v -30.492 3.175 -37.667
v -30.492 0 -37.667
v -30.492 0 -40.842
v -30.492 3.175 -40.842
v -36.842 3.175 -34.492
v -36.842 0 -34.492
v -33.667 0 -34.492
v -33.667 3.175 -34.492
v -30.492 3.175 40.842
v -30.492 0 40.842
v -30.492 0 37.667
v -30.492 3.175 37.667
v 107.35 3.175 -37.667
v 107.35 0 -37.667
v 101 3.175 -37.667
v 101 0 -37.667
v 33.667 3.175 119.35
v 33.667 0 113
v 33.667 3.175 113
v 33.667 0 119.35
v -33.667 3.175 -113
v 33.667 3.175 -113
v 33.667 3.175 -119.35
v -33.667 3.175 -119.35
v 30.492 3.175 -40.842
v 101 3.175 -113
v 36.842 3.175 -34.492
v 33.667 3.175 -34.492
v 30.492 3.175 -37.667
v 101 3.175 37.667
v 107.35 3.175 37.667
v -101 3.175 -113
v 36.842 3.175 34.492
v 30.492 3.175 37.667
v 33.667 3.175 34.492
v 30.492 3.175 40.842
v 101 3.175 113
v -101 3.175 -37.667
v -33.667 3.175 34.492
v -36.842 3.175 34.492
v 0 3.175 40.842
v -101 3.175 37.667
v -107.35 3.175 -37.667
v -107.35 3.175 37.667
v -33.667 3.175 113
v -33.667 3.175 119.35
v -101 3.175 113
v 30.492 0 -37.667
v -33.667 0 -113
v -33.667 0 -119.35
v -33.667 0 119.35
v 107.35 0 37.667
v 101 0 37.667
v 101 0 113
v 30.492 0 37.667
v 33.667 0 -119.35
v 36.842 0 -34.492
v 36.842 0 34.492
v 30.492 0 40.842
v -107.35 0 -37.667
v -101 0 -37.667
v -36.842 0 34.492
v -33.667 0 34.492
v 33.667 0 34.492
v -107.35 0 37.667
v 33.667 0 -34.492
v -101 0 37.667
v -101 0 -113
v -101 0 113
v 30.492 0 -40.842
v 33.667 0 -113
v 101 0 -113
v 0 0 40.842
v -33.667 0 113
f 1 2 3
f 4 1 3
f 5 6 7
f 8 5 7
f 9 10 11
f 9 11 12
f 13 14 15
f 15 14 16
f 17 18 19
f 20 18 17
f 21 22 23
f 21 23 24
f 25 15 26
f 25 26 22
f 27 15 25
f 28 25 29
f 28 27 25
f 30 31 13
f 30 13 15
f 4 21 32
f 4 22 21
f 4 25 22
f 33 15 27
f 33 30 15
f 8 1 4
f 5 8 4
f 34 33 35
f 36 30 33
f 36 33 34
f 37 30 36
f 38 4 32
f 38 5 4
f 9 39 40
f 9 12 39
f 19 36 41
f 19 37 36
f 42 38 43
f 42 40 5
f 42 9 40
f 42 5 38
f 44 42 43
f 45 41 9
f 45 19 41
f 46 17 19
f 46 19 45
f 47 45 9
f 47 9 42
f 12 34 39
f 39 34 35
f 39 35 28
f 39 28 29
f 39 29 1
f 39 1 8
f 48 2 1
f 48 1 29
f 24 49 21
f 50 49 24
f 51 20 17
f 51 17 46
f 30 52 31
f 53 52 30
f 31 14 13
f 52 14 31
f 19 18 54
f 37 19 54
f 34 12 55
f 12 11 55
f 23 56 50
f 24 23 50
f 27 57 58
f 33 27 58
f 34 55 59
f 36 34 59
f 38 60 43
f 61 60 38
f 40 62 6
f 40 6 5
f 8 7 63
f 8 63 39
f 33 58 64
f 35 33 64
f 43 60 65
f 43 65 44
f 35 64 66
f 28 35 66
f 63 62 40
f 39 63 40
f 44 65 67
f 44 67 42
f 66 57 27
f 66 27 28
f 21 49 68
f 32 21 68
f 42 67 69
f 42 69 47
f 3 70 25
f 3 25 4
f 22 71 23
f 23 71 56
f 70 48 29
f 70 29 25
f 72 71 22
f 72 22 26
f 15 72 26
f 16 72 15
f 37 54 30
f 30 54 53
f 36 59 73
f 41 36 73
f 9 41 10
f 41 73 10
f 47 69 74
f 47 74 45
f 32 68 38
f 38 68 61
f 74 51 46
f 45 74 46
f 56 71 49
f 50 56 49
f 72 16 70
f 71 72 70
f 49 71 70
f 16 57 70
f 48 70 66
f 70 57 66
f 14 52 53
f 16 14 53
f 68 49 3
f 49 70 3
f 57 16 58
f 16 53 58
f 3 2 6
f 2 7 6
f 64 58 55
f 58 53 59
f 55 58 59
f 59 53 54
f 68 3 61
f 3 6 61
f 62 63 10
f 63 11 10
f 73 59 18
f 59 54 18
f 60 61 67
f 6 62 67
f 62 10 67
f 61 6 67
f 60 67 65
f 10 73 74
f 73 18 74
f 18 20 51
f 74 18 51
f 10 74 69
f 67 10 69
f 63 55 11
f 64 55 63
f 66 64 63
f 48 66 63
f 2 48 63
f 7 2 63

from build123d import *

# Parameters (mm, degrees)
SKETCH1_W                 = 6.35
SKETCH1_H                 = 37.666666667
SKETCH1_W_2               = 33.666666667
SKETCH1_H_2               = 6.35
BOSS_EXTRUDE1_DEPTH       = 3.175
MIRROR1_START             = -101
MIRROR1_OUTLINE_W         = 3.175
MIRROR1_OUTLINE_H         = 3.175
MIRROR1_OUTLINE_H_2       = 72.158333333
MIRROR1_DEPTH             = 101
MIRROR1_START_2           = -107.35
MIRROR1_2_OUTLINE_W       = 3.175
MIRROR1_2_OUTLINE_H       = 37.666666667
MIRROR1_2_DEPTH           = 70.508333333
MIRROR1_START_3           = -33.666666667
MIRROR1_3_OUTLINE_W       = 3.175
MIRROR1_3_OUTLINE_H       = 34.491666667
MIRROR1_3_OUTLINE_H_2     = 6.35
MIRROR1_3_DEPTH           = 33.666666667
MIRROR1_4_OUTLINE_W       = 3.175
MIRROR1_4_OUTLINE_H       = 3.175
MIRROR1_4_DEPTH           = 70.508333333
MIRROR4_COPY_1_SKETCH_W   = 6.35
MIRROR4_COPY_1_SKETCH_H   = 37.666666667
MIRROR4_COPY_1_SKETCH_W_2 = 33.666666667
MIRROR4_COPY_1_SKETCH_H_2 = 6.35
MIRROR4_COPY_1_DEPTH      = 3.175
MIRROR4_COPY_2_SKETCH_W   = 6.35
MIRROR4_COPY_2_SKETCH_H   = 37.666666667
MIRROR4_COPY_2_SKETCH_W_2 = 33.666666667
MIRROR4_COPY_2_SKETCH_H_2 = 6.35
MIRROR4_COPY_2_DEPTH      = 3.175


# Read off the part's stored shape, not the designer's step: Mirror1
with BuildPart() as part:
    # Sketch1 → Boss-Extrude1 (new body)
    with BuildSketch(Plane(origin=(0, 0, 0), x_dir=(1, 0, 0), z_dir=(0, 1, 0))):
        Polygon((-33.666666667, 113), (-101, 113), (-101, 37.666666667), (-101, 0), (-36.841666667, 0), (-36.841666667, 34.491666667), (-33.666666667, 34.491666667), (-33.666666667, 0), (0, 0), (0, 37.666666667), (-30.491666667, 37.666666667), (-30.491666667, 40.841666667), (0, 40.841666667), (0, 113), align=None)
        with Locations((-104.175, 18.833333334)):
            Rectangle(SKETCH1_W, SKETCH1_H)
        with Locations((-16.833333334, 116.175)):
            Rectangle(SKETCH1_W_2, SKETCH1_H_2)
    boss_extrude1 = extrude(amount=BOSS_EXTRUDE1_DEPTH)



with BuildPart() as body_2:
    # Mirror1 outline → Mirror1 (new body)
    with BuildSketch(Plane.YZ.offset(MIRROR1_START)):
        with Locations((1.5875, 36.079166667)):
            Rectangle(MIRROR1_OUTLINE_W, MIRROR1_OUTLINE_H)
        with Locations((1.5875, 76.920833333)):
            Rectangle(MIRROR1_OUTLINE_W, MIRROR1_OUTLINE_H_2)
    extrude(amount=MIRROR1_DEPTH)


with BuildPart() as part_1:
    add(part.part)

    add(body_2.part)  # Mirror1 2 merges body 2
    # Mirror1 2 outline → Mirror1 2 (add)
    with BuildSketch(Plane.YZ.offset(MIRROR1_START_2)):
        with Locations((1.5875, 18.833333334)):
            Rectangle(MIRROR1_2_OUTLINE_W, MIRROR1_2_OUTLINE_H)
    extrude(amount=MIRROR1_2_DEPTH)

    # Mirror1 3 outline → Mirror1 3 (add)
    with BuildSketch(Plane.YZ.offset(MIRROR1_START_3)):
        with Locations((1.5875, 17.245833334)):
            Rectangle(MIRROR1_3_OUTLINE_W, MIRROR1_3_OUTLINE_H)
        with Locations((1.5875, 116.175)):
            Rectangle(MIRROR1_3_OUTLINE_W, MIRROR1_3_OUTLINE_H_2)
    extrude(amount=MIRROR1_3_DEPTH)

    # Mirror1 4 outline → Mirror1 4 (add)
    with BuildSketch(Plane.YZ.offset(MIRROR1_START)):
        with Locations((1.5875, 39.254166667)):
            Rectangle(MIRROR1_4_OUTLINE_W, MIRROR1_4_OUTLINE_H)
    extrude(amount=MIRROR1_4_DEPTH)

    # Mirror3: Boss-Extrude1 across plane
    add(boss_extrude1.mirror(Plane(origin=(0, 0, 0), x_dir=(0, 0, 1), z_dir=(1, 0, 0))))

    # Mirror4 copy 1 sketch → Mirror4 copy 1 (add)
    with BuildSketch(Plane(origin=(0, 0, 0), x_dir=(-1, 0, 0), z_dir=(0, 1, 0))):
        Polygon((-33.666666667, 113), (-101, 113), (-101, 37.666666667), (-101, 0), (-36.841666667, 0), (-36.841666667, 34.491666667), (-33.666666667, 34.491666667), (-33.666666667, 0), (0, 0), (0, 37.666666667), (-30.491666667, 37.666666667), (-30.491666667, 40.841666667), (0, 40.841666667), (0, 113), align=None)
        with Locations((-104.175, 18.833333334)):
            Rectangle(MIRROR4_COPY_1_SKETCH_W, MIRROR4_COPY_1_SKETCH_H)
        with Locations((-16.833333334, 116.175)):
            Rectangle(MIRROR4_COPY_1_SKETCH_W_2, MIRROR4_COPY_1_SKETCH_H_2)
    extrude(amount=MIRROR4_COPY_1_DEPTH)

    # Mirror4 copy 2 sketch → Mirror4 copy 2 (add)
    with BuildSketch(Plane(origin=(0, 0, 0), x_dir=(1, 0, 0), z_dir=(0, 1, 0))):
        Polygon((-33.666666667, -113), (-101, -113), (-101, -37.666666667), (-101, 0), (-36.841666667, 0), (-36.841666667, -34.491666667), (-33.666666667, -34.491666667), (-33.666666667, 0), (0, 0), (0, -37.666666667), (-30.491666667, -37.666666667), (-30.491666667, -40.841666667), (0, -40.841666667), (0, -113), align=None)
        with Locations((-104.175, -18.833333334)):
            Rectangle(MIRROR4_COPY_2_SKETCH_W, MIRROR4_COPY_2_SKETCH_H)
        with Locations((-16.833333334, -116.175)):
            Rectangle(MIRROR4_COPY_2_SKETCH_W_2, MIRROR4_COPY_2_SKETCH_H_2)
    extrude(amount=MIRROR4_COPY_2_DEPTH)


solid = part_1.part
